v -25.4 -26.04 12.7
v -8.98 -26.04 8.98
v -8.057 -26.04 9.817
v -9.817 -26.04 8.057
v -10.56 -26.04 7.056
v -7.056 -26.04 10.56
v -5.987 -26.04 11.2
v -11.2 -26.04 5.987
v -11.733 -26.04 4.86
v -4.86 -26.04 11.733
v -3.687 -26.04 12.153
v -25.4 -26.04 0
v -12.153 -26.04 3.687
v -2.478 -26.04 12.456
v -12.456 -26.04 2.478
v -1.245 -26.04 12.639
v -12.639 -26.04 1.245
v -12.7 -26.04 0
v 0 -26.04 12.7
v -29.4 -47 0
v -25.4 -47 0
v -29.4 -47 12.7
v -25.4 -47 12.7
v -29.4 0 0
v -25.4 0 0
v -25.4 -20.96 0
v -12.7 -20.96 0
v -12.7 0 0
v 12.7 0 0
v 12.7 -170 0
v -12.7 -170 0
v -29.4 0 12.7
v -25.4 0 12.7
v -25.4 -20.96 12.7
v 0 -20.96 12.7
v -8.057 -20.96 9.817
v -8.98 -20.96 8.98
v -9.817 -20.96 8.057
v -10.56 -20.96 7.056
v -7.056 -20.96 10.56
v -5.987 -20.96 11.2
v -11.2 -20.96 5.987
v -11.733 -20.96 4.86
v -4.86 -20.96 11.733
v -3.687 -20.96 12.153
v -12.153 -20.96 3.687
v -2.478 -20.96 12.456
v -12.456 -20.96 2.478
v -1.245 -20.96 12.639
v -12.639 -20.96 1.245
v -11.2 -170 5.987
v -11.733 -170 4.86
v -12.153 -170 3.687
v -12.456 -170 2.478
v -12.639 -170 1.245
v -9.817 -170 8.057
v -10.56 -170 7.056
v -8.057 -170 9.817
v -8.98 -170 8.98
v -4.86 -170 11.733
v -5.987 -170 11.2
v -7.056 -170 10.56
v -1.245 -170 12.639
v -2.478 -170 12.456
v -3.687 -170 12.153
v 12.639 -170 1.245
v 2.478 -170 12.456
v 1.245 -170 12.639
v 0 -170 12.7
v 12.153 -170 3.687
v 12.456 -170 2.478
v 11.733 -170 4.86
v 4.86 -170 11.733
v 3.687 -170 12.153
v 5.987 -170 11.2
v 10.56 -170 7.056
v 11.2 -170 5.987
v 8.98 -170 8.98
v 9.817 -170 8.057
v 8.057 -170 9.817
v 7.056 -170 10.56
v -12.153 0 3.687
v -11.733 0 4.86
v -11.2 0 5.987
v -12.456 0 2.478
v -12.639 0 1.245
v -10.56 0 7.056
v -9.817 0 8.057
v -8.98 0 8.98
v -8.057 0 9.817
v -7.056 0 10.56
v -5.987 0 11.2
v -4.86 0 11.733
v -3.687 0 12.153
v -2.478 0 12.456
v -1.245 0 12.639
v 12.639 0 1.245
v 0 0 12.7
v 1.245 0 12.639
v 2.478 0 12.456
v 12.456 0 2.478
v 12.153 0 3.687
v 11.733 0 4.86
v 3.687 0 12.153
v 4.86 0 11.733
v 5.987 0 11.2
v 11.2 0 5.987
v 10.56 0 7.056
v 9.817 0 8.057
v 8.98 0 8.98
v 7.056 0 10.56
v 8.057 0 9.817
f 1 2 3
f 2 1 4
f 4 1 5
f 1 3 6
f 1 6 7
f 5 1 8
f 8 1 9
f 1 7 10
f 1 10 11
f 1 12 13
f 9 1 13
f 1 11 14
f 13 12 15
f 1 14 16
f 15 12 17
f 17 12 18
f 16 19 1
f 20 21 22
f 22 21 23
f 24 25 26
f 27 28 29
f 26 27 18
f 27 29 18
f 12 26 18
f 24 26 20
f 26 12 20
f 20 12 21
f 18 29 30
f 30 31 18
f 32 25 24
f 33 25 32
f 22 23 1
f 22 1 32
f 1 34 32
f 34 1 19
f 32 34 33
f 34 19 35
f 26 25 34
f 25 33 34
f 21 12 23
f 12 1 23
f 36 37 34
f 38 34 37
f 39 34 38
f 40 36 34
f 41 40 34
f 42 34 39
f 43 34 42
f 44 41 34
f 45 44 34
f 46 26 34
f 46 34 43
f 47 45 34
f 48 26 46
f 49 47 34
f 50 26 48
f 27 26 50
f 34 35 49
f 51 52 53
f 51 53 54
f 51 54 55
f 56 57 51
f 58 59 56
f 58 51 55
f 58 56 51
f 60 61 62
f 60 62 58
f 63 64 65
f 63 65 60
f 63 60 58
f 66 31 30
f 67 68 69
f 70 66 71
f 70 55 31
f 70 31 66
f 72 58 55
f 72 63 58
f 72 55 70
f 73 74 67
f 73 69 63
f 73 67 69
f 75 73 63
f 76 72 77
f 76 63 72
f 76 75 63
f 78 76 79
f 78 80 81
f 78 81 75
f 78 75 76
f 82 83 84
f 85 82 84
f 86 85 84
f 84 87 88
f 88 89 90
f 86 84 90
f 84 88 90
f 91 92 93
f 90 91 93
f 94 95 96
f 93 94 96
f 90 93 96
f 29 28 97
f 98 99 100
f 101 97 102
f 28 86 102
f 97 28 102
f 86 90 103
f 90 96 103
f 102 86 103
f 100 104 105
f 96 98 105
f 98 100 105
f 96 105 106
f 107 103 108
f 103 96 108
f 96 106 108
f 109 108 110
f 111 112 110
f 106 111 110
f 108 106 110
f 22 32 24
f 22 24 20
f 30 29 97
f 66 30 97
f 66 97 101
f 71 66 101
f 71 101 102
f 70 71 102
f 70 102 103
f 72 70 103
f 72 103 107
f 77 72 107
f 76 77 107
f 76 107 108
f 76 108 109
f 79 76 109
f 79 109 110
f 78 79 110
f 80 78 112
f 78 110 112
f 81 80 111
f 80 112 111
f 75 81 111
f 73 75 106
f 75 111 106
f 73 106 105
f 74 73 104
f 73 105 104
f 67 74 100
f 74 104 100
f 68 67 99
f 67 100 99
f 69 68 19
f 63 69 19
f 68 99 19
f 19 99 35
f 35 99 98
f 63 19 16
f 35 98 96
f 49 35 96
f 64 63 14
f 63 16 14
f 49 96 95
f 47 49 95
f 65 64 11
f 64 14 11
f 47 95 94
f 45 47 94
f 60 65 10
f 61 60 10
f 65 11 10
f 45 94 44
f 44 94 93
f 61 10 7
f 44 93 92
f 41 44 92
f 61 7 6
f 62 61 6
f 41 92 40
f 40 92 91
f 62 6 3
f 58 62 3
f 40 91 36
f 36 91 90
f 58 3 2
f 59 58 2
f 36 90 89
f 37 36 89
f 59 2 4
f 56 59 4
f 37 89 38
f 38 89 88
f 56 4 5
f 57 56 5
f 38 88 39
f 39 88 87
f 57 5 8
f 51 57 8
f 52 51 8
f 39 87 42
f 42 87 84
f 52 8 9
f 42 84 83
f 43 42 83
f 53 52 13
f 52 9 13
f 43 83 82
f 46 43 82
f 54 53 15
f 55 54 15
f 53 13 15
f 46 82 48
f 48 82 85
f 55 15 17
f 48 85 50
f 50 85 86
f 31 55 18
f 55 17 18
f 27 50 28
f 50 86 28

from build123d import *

# Parameters (mm, degrees)
F1_DEPTH = 170
F2_W     = 25.4
F2_H     = 5.08
F3_DEPTH = 12.7
F4_W     = 20.96
F4_H     = 12.7
F4_W_2   = 2.54
F5_DEPTH = 4


with BuildPart() as f1:
    # F0 (on Front) → F1 (new body)
    with BuildSketch(Plane.XZ):
        with BuildLine():
            Line((-12.7, 0), (12.7, 0))
            ThreePointArc((12.7, 0), (0, 12.7), (-12.7, 0))
        make_face()
    extrude(amount=F1_DEPTH)

    # F2 (on face) → F3 (join)
    with BuildSketch(Plane(origin=(0, 0, 0), x_dir=(1, 0, 0), z_dir=(0, 0, -1))):
        with Locations((-12.7, 23.5)):
            Rectangle(F2_W, F2_H)
    extrude(amount=-F3_DEPTH)

    # F4 (on face) → F5 (join)
    with BuildSketch(Plane(origin=(-25.4, 0, 0), x_dir=(0, -1, 0), z_dir=(-1, 0, 0))):
        with Locations((36.52, 6.35)):
            Rectangle(F4_W, F4_H)
        with Locations((10.48, 6.35)):
            Rectangle(F4_W, F4_H)
        with Locations((22.23, 6.35)):
            Rectangle(F4_W_2, F4_H)
        with Locations((24.77, 6.35)):
            Rectangle(F4_W_2, F4_H)
    extrude(amount=F5_DEPTH)


solid = f1.part
